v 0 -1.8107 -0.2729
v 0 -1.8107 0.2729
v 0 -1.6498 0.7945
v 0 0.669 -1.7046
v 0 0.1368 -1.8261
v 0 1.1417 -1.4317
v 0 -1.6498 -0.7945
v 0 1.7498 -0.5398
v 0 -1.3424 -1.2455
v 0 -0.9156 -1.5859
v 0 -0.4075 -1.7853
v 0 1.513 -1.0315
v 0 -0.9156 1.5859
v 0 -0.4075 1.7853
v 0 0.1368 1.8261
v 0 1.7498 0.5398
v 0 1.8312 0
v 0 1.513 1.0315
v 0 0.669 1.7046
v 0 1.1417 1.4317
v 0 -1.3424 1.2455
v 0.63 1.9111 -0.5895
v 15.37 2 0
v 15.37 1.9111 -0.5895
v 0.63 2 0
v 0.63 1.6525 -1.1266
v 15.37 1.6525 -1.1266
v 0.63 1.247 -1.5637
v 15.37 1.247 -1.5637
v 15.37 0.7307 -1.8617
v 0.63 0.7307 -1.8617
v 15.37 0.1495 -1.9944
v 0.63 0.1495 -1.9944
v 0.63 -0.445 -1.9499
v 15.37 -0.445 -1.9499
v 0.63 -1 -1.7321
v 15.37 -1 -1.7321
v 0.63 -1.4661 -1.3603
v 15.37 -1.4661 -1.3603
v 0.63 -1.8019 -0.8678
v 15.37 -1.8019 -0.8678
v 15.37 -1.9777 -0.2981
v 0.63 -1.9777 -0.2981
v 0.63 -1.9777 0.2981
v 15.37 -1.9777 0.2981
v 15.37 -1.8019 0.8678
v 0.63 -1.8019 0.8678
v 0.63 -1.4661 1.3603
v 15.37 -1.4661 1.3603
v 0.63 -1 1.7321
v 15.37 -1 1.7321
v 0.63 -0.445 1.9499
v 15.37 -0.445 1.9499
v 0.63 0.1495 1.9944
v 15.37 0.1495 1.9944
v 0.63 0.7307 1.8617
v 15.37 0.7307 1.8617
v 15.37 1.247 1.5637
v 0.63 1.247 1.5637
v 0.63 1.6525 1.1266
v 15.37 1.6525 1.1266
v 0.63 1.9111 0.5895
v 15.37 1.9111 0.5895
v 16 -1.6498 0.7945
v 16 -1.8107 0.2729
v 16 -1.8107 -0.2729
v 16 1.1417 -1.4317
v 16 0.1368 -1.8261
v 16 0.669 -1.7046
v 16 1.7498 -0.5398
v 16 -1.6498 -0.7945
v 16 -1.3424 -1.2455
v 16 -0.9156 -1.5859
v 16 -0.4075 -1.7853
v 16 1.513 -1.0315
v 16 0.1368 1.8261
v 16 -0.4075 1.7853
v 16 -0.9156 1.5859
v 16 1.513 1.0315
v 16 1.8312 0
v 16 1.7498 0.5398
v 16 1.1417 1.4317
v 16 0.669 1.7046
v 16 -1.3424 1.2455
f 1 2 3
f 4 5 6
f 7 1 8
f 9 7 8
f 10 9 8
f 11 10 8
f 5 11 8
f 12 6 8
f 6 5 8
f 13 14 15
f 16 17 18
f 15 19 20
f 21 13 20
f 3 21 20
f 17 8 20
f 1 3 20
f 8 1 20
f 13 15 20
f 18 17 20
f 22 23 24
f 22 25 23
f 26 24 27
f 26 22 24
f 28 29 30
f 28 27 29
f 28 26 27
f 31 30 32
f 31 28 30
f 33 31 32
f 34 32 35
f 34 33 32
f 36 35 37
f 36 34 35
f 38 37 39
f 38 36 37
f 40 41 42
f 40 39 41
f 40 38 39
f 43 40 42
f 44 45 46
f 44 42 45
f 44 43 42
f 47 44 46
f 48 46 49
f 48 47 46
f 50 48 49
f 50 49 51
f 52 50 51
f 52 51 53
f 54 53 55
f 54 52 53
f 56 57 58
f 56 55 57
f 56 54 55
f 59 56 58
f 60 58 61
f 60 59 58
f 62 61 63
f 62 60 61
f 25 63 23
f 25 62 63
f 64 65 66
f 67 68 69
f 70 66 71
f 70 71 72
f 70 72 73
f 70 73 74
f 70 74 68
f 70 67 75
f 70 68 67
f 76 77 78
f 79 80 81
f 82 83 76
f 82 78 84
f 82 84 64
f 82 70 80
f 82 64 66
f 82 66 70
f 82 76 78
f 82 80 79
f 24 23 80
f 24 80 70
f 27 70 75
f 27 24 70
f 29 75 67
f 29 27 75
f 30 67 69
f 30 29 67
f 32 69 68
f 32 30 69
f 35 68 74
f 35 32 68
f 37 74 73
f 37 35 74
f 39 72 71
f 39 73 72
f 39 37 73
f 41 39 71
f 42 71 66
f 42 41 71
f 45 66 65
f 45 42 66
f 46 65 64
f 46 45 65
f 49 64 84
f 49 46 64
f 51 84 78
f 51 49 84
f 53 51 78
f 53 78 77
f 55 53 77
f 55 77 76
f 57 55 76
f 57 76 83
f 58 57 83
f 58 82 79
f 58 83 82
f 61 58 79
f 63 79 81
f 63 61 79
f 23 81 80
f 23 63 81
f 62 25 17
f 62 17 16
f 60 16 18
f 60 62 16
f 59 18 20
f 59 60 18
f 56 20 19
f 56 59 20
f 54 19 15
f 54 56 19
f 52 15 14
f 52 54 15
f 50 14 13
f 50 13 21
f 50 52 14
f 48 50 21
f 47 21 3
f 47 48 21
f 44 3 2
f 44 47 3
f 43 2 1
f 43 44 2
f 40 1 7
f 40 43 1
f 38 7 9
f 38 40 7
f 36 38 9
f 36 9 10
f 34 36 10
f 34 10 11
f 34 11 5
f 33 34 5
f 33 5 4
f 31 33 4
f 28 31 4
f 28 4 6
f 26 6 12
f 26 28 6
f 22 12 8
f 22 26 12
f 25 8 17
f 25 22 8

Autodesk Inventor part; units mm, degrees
ref_plane "YZ Plane" through (0, 0, 0) normal (1, 0, 0) x (0, 1, 0)
ref_plane "XZ Plane" through (0, 0, 0) normal (0, 1, 0) x (-1, 0, 0)
ref_plane "XY Plane" through (0, 0, 0) normal (0, 0, 1) x (1, 0, 0)
sketch "Skizze" plane through (0, 0, 0) normal (1, 0, 0) x (0, 1, 0)
  circle A0 centre (0, 0) radius 2
  dimension "d1" = 4
extrude "Körper" add sketch "Skizze" along normal blind 16
chamfer "Fase1" distance 0.63 angle 15 1 edges at (0, -2, 0) measured on face at (10.6667, 1.9935, -0.1609)
chamfer "Skizze2" distance 0.63 angle 15 1 edges at (16, -2, 0) measured on face at (10.8767, 1.9935, -0.1609)
equation "\"d1\" = NND"
equation "\"d2\" = NLG"
equation "\"d8\" = PHH"
equation "\"d9\" = FAWI"
equation "\"d12\" = PHH"
equation "\"d4\" = PHH"
equation "\"d5\" = FAWI"
equation "\"d11\" = PHH"
equation "\"NND\" = 4"
equation "\"NLG\" = 16"
equation "\"PHH\" = 0.63"
equation "\"FAWI\" = 15deg"
equation "\"KAH\" = 0"
properties part number "ISO 2338 - 4 m6 x 16" material "Edelstahl, austenitisch"
